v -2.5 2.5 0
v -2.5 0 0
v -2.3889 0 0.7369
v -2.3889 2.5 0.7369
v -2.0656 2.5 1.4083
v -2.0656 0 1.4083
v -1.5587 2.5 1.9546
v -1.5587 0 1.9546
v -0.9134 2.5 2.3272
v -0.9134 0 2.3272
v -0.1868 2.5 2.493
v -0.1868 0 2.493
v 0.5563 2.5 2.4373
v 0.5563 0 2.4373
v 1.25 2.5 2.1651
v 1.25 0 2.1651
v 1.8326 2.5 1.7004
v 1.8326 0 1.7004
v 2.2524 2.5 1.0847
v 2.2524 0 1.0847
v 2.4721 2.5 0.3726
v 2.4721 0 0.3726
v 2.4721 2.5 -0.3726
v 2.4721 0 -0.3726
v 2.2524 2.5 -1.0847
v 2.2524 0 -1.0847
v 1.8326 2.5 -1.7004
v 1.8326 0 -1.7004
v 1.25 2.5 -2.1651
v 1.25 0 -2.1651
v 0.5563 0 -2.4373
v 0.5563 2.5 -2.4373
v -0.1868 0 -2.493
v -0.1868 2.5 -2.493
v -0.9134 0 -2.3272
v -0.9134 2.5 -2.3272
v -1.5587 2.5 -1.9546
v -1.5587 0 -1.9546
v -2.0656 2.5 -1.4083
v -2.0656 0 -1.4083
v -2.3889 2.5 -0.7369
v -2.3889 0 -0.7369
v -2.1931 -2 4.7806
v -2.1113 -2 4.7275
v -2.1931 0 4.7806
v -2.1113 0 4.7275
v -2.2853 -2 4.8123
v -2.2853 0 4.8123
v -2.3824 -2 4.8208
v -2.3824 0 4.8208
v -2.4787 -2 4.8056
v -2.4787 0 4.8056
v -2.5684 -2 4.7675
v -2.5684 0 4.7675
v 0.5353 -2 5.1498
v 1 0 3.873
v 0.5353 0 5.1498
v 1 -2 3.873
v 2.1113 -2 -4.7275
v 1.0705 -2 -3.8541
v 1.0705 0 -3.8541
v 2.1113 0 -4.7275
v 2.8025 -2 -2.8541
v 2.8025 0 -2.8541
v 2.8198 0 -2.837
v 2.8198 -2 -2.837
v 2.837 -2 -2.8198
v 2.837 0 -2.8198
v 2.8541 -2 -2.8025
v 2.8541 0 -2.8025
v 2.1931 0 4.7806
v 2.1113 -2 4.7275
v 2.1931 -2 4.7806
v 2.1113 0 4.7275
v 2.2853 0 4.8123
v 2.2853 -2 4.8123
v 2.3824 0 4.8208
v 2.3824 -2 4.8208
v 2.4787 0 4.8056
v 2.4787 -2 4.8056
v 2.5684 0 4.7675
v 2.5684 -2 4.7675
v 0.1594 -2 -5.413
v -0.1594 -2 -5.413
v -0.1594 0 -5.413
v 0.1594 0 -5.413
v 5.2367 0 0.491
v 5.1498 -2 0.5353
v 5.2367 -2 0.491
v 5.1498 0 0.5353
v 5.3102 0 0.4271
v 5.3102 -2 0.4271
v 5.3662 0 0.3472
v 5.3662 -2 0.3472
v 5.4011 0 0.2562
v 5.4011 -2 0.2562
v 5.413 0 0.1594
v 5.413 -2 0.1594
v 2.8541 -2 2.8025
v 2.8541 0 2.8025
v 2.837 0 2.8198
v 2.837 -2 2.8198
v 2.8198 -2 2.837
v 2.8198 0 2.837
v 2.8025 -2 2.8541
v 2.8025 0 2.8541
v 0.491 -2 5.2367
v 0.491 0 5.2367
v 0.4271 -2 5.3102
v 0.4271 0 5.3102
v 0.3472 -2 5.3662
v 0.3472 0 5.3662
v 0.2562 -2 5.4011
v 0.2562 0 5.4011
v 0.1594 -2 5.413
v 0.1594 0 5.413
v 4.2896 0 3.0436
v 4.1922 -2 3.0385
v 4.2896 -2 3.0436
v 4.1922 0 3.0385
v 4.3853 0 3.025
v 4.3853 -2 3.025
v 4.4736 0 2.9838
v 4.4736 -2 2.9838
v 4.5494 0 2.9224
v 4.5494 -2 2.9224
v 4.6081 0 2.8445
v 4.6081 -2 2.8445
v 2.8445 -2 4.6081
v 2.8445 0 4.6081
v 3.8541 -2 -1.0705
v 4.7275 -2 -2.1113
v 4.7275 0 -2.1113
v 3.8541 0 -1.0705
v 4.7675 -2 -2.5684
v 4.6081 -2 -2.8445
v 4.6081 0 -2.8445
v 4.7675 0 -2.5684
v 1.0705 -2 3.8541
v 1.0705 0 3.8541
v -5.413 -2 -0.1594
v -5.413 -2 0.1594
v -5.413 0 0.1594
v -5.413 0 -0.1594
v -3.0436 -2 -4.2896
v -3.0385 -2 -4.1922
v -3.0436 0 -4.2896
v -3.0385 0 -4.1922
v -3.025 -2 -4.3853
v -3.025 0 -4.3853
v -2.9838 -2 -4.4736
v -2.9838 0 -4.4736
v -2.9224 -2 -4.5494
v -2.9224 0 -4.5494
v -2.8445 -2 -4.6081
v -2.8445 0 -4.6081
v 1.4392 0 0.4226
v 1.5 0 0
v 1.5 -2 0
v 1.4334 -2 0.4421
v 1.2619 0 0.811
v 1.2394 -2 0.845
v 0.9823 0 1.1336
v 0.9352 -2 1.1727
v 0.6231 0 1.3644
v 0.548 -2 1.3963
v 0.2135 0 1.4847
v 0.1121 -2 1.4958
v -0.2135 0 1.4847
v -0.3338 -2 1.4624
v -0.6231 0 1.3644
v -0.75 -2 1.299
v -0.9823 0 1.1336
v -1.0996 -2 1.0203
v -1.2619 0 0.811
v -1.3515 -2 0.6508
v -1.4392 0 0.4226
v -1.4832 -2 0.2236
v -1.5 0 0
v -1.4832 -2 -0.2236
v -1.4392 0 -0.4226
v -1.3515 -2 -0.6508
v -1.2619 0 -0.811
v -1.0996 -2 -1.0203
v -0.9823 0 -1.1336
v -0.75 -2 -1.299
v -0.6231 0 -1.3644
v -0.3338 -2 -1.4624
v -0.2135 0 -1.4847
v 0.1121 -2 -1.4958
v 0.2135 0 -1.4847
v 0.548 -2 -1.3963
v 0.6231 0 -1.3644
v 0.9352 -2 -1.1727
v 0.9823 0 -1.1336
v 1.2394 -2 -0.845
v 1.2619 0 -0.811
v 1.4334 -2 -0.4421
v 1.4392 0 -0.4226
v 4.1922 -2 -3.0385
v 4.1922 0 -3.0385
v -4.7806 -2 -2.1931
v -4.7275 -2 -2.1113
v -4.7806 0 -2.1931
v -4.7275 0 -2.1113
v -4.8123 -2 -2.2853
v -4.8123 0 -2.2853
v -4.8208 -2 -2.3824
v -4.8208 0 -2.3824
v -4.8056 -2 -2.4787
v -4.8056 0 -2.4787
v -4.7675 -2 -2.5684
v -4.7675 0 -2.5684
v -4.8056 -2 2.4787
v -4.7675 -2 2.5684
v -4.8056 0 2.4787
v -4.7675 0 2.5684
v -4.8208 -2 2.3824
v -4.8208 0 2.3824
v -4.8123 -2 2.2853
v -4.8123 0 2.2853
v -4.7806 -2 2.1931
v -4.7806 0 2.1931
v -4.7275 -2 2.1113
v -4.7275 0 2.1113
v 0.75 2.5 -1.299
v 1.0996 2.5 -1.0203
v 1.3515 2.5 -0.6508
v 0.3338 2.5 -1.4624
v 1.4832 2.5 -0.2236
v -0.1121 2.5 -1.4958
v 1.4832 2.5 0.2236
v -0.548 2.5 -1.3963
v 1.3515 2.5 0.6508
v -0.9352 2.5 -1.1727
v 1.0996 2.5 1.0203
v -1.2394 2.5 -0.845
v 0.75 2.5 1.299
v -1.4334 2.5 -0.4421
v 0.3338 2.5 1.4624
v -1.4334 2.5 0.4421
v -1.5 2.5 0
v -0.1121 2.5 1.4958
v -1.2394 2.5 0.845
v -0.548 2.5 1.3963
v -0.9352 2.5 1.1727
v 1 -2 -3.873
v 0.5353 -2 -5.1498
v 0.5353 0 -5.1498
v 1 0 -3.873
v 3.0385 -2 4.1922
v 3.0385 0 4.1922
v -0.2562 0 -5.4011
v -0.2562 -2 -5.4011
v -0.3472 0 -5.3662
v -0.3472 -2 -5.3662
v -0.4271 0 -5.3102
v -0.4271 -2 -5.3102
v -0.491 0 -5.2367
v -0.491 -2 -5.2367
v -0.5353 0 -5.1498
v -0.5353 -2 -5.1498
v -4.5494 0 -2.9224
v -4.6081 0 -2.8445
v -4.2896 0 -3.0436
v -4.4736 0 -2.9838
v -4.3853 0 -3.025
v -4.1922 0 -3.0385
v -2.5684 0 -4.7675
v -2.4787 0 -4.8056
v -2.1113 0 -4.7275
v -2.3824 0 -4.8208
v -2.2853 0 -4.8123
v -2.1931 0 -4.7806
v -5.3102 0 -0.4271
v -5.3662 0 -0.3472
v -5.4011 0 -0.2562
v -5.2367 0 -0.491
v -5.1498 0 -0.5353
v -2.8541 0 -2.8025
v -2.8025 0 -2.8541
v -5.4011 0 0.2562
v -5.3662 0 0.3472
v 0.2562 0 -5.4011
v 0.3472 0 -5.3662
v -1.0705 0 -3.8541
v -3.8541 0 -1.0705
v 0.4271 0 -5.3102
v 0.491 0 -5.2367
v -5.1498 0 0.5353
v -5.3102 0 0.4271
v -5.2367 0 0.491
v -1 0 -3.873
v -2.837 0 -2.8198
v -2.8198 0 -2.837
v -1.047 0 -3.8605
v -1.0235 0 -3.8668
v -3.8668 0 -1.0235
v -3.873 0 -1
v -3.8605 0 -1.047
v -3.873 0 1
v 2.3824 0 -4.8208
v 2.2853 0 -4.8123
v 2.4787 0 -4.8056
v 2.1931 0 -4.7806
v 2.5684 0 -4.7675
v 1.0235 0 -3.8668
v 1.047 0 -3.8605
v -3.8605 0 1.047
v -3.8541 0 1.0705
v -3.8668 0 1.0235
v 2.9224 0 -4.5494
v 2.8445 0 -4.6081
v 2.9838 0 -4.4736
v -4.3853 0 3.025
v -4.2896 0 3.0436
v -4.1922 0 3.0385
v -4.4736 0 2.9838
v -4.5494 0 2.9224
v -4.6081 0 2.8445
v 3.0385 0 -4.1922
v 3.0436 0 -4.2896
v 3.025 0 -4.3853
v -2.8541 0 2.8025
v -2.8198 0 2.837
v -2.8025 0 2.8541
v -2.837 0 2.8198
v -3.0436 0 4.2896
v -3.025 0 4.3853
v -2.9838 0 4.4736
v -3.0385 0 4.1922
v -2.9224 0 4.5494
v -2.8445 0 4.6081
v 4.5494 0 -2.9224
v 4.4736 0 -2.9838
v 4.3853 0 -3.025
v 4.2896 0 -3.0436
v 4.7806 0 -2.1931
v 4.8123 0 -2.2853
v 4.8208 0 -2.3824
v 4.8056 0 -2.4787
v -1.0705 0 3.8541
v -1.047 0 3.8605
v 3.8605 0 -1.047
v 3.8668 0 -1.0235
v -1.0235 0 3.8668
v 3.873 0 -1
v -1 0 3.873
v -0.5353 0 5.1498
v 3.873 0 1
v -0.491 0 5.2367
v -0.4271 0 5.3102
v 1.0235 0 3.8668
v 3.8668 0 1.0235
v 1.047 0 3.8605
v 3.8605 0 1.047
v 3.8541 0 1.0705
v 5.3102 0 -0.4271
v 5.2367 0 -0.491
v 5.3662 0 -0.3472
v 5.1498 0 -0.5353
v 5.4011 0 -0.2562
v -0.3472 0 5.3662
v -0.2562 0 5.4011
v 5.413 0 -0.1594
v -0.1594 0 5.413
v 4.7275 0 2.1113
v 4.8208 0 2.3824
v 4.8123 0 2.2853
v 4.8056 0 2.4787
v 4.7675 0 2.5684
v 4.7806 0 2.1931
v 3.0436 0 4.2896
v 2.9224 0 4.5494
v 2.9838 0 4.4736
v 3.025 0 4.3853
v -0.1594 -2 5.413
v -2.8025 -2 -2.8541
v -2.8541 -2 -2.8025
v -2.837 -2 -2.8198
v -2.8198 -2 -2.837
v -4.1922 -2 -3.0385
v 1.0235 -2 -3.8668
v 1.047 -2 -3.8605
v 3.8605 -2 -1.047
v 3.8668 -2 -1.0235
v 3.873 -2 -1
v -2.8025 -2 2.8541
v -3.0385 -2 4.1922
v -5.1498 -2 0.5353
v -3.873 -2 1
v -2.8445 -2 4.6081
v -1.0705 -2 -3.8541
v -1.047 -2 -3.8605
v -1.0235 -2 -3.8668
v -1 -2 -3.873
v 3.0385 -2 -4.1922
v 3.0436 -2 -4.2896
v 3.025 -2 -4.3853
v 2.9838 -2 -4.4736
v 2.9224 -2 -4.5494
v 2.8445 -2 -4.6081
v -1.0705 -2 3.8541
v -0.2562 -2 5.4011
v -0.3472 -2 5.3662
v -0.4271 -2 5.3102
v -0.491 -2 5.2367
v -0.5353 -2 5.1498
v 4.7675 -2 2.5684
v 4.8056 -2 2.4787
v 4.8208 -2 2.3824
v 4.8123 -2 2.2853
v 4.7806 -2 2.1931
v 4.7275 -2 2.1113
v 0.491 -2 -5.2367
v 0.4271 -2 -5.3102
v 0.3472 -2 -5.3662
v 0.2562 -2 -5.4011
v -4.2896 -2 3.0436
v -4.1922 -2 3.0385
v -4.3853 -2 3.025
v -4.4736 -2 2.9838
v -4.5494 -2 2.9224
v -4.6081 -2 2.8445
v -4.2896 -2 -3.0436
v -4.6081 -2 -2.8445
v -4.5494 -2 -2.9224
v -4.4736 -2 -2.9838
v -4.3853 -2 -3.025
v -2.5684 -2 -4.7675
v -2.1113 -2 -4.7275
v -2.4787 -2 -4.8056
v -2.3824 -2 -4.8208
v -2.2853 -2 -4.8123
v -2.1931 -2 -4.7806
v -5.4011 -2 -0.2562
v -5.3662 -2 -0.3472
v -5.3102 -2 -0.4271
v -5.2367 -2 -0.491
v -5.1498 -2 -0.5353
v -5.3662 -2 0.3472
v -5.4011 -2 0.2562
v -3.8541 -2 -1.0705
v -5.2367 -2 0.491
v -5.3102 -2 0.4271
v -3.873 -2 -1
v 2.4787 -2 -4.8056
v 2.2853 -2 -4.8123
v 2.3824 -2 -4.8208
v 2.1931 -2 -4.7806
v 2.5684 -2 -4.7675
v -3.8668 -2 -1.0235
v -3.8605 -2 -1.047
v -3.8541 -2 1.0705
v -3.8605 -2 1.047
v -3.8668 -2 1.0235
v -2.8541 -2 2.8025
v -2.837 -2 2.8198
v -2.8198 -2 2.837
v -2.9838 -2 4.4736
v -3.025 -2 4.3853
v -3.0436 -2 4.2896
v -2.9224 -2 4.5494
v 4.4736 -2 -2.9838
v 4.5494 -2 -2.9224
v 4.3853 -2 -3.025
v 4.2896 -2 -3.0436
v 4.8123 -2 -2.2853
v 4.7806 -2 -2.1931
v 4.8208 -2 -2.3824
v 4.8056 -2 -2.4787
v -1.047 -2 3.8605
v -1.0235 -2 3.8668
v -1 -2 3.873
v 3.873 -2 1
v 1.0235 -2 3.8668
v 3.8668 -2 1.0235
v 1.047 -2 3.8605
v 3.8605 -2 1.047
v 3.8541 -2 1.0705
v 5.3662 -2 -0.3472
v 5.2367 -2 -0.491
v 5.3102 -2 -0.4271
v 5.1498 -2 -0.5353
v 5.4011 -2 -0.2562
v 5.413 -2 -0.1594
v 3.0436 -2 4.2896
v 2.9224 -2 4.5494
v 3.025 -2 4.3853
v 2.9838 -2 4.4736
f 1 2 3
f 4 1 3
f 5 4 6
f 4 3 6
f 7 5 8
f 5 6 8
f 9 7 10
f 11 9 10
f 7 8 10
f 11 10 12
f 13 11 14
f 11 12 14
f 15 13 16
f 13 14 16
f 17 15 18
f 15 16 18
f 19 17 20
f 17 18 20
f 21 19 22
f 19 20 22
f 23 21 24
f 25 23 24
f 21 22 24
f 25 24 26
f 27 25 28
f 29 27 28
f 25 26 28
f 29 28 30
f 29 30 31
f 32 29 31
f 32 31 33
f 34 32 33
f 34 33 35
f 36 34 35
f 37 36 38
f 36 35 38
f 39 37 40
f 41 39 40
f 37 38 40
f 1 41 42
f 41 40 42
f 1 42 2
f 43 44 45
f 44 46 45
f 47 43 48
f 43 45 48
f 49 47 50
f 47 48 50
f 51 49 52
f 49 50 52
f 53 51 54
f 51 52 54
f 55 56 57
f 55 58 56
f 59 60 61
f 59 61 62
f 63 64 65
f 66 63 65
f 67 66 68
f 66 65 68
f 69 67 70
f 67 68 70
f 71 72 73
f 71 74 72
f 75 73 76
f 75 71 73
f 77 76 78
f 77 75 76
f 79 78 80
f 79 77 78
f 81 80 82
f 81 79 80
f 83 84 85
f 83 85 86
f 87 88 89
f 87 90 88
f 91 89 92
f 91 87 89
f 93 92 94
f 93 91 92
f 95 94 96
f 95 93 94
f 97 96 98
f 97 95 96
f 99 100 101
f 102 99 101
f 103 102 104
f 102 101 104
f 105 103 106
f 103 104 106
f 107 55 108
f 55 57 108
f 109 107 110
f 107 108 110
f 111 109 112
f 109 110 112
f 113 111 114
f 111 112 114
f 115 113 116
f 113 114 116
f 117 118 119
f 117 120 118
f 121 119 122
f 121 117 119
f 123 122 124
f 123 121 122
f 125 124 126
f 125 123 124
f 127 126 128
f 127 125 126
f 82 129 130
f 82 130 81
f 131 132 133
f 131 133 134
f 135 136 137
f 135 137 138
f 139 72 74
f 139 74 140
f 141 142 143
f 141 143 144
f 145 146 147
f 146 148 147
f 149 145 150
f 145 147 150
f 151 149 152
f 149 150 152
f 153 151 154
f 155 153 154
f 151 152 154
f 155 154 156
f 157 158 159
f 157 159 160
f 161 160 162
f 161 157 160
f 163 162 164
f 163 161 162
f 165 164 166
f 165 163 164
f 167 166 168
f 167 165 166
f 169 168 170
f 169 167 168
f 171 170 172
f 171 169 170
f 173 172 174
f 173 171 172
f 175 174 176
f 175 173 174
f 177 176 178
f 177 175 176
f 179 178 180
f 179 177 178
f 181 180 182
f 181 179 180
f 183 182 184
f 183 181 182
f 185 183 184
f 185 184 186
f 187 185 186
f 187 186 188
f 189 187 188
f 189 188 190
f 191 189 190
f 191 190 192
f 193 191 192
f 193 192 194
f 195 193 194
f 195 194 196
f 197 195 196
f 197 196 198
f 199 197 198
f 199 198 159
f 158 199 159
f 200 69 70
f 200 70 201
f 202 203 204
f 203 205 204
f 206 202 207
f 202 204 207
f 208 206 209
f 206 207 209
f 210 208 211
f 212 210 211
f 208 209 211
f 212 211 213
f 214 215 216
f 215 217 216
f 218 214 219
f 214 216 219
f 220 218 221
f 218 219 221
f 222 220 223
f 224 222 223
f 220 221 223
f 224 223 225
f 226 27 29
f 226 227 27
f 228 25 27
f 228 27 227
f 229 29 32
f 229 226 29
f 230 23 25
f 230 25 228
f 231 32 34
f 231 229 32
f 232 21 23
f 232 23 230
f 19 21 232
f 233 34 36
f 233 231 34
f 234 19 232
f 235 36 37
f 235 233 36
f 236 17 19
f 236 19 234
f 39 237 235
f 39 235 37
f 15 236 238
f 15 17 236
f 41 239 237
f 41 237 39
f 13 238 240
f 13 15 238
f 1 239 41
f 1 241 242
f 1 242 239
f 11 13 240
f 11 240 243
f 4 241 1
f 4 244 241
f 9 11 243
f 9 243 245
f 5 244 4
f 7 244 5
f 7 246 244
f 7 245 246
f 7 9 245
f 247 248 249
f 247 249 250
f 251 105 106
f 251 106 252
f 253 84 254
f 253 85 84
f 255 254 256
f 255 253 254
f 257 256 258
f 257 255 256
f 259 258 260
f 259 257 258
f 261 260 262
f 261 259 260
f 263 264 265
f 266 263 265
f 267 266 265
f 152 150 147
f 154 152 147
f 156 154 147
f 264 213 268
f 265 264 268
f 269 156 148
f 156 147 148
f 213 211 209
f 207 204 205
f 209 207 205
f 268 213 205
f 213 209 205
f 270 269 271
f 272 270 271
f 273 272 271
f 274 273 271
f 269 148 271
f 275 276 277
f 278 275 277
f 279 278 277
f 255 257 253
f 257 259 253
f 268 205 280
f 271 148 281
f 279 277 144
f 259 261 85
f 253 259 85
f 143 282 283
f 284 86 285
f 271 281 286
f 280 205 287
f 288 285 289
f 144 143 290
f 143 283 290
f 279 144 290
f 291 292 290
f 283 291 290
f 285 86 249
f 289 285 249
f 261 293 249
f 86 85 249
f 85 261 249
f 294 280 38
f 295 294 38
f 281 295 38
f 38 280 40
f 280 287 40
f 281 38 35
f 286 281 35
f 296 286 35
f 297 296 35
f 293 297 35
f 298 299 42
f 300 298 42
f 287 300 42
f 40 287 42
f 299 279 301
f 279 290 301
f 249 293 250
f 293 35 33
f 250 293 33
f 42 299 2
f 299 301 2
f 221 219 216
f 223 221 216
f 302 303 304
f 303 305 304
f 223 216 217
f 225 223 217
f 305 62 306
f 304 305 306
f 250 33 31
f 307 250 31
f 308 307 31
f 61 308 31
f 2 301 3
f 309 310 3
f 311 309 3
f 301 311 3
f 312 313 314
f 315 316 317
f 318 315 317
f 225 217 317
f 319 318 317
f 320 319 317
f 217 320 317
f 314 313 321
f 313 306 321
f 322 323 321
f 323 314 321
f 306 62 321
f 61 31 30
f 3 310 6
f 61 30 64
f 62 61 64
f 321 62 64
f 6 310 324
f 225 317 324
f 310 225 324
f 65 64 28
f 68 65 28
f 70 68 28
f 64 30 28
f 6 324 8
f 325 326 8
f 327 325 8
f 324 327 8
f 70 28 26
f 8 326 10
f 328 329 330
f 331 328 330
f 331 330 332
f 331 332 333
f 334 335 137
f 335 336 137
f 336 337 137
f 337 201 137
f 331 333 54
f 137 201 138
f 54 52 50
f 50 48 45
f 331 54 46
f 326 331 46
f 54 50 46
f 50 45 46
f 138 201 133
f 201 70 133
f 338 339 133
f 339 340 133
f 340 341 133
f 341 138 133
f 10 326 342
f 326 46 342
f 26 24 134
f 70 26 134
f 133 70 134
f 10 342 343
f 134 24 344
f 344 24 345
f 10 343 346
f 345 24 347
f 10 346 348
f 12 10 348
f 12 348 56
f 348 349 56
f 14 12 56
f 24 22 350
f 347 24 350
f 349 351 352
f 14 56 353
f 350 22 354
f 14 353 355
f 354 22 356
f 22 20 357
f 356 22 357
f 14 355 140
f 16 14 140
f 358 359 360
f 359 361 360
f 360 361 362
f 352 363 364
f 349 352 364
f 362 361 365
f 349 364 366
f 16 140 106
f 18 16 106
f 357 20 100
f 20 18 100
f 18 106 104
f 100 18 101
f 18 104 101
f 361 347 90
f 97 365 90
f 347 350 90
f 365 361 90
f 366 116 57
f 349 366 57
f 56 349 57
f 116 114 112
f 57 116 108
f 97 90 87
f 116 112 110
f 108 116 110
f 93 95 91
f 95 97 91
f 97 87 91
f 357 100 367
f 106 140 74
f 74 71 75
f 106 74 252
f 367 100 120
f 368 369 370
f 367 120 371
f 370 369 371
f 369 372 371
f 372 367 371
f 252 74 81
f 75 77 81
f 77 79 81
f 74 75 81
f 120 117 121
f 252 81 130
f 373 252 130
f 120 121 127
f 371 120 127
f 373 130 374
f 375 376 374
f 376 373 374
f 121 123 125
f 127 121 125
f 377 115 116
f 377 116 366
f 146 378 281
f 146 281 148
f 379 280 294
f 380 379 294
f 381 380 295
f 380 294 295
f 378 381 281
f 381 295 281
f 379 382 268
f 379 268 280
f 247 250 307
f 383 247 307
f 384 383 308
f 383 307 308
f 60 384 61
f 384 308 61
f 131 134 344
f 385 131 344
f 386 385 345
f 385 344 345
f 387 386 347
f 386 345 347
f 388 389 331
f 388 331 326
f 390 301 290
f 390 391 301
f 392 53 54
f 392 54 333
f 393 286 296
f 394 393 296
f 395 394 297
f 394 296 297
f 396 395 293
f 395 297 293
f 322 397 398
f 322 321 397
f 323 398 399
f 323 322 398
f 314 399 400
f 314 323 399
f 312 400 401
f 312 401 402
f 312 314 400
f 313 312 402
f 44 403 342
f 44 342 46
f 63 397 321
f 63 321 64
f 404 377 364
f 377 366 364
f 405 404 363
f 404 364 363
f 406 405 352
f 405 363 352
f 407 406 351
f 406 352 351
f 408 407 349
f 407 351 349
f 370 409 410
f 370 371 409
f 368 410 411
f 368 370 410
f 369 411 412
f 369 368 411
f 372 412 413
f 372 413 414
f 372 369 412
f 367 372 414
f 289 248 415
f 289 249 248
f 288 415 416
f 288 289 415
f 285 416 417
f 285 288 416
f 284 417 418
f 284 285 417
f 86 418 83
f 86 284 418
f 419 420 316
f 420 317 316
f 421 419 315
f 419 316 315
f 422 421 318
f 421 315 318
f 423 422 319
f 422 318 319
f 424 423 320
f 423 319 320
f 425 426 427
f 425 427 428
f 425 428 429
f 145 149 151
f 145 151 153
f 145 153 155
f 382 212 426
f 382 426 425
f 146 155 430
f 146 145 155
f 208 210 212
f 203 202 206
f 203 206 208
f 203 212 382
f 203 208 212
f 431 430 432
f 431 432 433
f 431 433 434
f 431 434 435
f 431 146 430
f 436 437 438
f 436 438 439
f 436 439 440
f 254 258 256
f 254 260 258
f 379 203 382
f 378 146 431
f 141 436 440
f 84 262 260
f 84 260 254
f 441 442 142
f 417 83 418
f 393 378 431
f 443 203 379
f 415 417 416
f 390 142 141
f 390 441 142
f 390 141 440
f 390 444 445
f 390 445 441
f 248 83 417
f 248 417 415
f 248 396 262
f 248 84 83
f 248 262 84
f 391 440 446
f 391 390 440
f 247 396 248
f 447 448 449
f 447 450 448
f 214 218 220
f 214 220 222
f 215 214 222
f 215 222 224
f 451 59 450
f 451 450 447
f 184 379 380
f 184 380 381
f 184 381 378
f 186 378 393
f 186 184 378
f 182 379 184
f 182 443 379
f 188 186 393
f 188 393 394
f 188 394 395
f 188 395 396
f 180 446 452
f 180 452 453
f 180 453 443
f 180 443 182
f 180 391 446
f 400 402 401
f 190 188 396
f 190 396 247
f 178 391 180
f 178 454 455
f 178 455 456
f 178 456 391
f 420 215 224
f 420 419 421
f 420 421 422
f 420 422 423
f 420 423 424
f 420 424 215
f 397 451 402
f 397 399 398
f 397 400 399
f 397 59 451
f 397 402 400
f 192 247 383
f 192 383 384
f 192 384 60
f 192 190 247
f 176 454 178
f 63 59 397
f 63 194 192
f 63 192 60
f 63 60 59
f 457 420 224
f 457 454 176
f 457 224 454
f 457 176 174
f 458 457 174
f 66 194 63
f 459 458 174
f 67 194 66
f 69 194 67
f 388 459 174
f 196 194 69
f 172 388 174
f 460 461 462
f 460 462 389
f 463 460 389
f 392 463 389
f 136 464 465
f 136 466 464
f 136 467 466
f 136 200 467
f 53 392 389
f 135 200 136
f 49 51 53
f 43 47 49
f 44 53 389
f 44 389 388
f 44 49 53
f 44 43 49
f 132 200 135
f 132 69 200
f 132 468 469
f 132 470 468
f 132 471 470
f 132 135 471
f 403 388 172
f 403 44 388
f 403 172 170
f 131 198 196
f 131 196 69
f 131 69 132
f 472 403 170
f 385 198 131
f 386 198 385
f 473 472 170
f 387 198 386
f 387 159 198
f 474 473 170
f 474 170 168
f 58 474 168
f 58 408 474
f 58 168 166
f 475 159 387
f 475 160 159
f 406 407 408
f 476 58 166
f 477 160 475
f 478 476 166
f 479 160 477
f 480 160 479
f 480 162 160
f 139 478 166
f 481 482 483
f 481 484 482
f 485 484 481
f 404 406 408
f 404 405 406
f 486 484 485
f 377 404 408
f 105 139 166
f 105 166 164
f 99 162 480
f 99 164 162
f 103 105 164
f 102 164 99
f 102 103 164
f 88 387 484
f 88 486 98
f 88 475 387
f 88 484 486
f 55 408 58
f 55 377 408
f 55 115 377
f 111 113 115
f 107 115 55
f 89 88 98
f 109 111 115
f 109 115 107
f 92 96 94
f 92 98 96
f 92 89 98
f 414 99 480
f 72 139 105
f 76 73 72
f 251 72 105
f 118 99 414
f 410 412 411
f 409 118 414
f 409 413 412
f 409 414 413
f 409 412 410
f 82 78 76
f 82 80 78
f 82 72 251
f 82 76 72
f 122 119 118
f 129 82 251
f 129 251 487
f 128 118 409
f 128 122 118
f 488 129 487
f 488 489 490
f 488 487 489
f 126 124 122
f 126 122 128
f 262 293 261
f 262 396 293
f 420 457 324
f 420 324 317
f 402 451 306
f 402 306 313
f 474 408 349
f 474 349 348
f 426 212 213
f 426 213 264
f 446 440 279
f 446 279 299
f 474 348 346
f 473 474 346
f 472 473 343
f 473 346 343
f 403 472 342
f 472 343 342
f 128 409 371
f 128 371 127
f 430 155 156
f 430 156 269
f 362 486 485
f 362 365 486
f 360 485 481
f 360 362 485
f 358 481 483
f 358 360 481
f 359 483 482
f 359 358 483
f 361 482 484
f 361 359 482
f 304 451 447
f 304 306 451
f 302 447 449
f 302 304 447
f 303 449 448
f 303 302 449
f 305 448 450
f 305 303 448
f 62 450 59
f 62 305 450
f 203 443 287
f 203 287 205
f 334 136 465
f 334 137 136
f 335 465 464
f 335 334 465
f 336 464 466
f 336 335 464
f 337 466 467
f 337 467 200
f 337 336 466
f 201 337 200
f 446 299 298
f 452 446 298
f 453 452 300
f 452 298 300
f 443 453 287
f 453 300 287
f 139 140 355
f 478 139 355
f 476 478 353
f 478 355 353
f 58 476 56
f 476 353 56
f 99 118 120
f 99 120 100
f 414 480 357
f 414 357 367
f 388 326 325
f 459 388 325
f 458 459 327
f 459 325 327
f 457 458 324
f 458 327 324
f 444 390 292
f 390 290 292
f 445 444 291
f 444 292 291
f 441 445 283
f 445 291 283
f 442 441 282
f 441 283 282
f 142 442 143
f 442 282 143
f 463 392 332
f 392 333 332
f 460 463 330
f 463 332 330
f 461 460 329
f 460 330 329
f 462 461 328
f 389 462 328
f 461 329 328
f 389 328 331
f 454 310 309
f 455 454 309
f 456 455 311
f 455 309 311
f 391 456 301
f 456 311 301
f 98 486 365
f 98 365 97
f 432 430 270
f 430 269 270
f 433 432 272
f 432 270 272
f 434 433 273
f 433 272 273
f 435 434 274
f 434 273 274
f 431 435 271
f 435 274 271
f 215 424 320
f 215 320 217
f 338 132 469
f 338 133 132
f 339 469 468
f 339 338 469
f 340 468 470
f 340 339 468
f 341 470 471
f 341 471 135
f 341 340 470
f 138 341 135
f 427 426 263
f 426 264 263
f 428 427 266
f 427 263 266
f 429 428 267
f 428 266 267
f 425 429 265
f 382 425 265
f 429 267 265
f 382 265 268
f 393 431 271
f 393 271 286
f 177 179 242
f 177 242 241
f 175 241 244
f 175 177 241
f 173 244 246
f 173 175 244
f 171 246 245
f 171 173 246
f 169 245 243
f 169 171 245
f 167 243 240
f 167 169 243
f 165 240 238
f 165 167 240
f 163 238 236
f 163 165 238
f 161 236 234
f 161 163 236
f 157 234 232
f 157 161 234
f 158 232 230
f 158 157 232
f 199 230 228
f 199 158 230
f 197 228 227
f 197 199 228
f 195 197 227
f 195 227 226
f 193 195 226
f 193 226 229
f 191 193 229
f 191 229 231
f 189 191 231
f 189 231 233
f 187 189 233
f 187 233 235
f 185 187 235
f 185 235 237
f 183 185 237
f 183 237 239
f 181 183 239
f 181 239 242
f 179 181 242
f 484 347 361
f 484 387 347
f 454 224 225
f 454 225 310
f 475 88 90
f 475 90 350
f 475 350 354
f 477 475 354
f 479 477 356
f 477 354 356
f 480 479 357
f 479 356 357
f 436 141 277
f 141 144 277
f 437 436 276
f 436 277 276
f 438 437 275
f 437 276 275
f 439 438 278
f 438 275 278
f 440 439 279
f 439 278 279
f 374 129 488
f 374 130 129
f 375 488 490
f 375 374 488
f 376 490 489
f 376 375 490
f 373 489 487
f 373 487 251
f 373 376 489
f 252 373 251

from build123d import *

# Parameters (mm, degrees)
F0_R     = 4
F0_R_2   = 1.5
F1_DEPTH = 2
F3_DEPTH = 2
F4_R     = 2.5
F4_R_2   = 1.5
F5_DEPTH = 2.5
F6_R     = 0.4


with BuildPart() as f1:
    # F0 (on Front) → F1 (new body)
    with BuildSketch(Plane.XZ):
        Circle(F0_R)
        Circle(F0_R_2, mode=Mode.SUBTRACT)
    extrude(amount=F1_DEPTH)

    # F2 (on face) → F3 (join, through all)
    with BuildSketch(Plane.XZ.offset(2)):
        Polygon((0.439486, 5.412983), (0, 5.412983), (-0.439486, 5.412983), (-1, 3.872983), (1, 3.872983), align=None)
        Polygon((-3.087098, 4.468038), (-2.802517, 2.854102), (-1.070466, 3.854102), (-2.325886, 4.907524), (-2.706492, 4.687781), align=None)
        Polygon((-4.907524, 2.325886), (-3.854102, 1.070466), (-2.854102, 2.802517), (-4.468038, 3.087098), (-4.687781, 2.706492), align=None)
        Polygon((-5.412983, -0.439486), (-3.872983, -1), (-3.872983, 1), (-5.412983, 0.439486), (-5.412983, 0), align=None)
        Polygon((-4.468038, -3.087098), (-2.854102, -2.802517), (-3.854102, -1.070466), (-4.907524, -2.325886), (-4.687781, -2.706492), align=None)
        Polygon((-2.325886, -4.907524), (-1.070466, -3.854102), (-2.802517, -2.854102), (-3.087098, -4.468038), (-2.706492, -4.687781), align=None)
        Polygon((0.439486, -5.412983), (1, -3.872983), (-1, -3.872983), (-0.439486, -5.412983), (0, -5.412983), align=None)
        Polygon((3.087098, -4.468038), (2.802517, -2.854102), (1.070466, -3.854102), (2.325886, -4.907524), (2.706492, -4.687781), align=None)
        Polygon((4.907524, -2.325886), (3.854102, -1.070466), (2.854102, -2.802517), (4.468038, -3.087098), (4.687781, -2.706492), align=None)
        Polygon((5.412983, 0.439486), (3.872983, 1), (3.872983, -1), (5.412983, -0.439486), (5.412983, 0), align=None)
        Polygon((4.468038, 3.087098), (2.854102, 2.802517), (3.854102, 1.070466), (4.907524, 2.325886), (4.687781, 2.706492), align=None)
        Polygon((2.325886, 4.907524), (1.070466, 3.854102), (2.802517, 2.854102), (3.087098, 4.468038), (2.706492, 4.687781), align=None)
    extrude(amount=-F3_DEPTH)

    # F4 (on face) → F5 (join)
    with BuildSketch(Plane(origin=(0, 0, 0), x_dir=(-1, 0, 0), z_dir=(0, 1, 0))):
        Circle(F4_R)
        Circle(F4_R_2, mode=Mode.SUBTRACT)
    extrude(amount=F5_DEPTH)

    # F6
    f6_edges = [f1.edges().sort_by_distance(p)[0] for p in [
        (2.325886, -1, 4.907524),
        (3.087098, -1, 4.468038),
        (4.468038, -1, 3.087098),
        (4.907524, -1, 2.325886),
        (5.412983, -1, 0.439486),
        (5.412983, -1, -0.439486),
        (4.907524, -1, -2.325886),
        (4.468038, -1, -3.087098),
        (3.087098, -1, -4.468038),
        (2.325886, -1, -4.907524),
        (0.439486, -1, -5.412983),
        (-0.439486, -1, -5.412983),
        (-2.325886, -1, -4.907524),
        (-3.087098, -1, -4.468038),
        (-4.468038, -1, -3.087098),
        (-4.907524, -1, -2.325886),
        (-5.412983, -1, -0.439486),
        (-5.412983, -1, 0.439486),
        (-4.907524, -1, 2.325886),
        (-4.468038, -1, 3.087098),
        (-3.087098, -1, 4.468038),
        (-2.325886, -1, 4.907524),
        (-0.439486, -1, 5.412983),
        (0.439486, -1, 5.412983),
    ]]
    fillet(f6_edges, radius=F6_R)


solid = f1.part
